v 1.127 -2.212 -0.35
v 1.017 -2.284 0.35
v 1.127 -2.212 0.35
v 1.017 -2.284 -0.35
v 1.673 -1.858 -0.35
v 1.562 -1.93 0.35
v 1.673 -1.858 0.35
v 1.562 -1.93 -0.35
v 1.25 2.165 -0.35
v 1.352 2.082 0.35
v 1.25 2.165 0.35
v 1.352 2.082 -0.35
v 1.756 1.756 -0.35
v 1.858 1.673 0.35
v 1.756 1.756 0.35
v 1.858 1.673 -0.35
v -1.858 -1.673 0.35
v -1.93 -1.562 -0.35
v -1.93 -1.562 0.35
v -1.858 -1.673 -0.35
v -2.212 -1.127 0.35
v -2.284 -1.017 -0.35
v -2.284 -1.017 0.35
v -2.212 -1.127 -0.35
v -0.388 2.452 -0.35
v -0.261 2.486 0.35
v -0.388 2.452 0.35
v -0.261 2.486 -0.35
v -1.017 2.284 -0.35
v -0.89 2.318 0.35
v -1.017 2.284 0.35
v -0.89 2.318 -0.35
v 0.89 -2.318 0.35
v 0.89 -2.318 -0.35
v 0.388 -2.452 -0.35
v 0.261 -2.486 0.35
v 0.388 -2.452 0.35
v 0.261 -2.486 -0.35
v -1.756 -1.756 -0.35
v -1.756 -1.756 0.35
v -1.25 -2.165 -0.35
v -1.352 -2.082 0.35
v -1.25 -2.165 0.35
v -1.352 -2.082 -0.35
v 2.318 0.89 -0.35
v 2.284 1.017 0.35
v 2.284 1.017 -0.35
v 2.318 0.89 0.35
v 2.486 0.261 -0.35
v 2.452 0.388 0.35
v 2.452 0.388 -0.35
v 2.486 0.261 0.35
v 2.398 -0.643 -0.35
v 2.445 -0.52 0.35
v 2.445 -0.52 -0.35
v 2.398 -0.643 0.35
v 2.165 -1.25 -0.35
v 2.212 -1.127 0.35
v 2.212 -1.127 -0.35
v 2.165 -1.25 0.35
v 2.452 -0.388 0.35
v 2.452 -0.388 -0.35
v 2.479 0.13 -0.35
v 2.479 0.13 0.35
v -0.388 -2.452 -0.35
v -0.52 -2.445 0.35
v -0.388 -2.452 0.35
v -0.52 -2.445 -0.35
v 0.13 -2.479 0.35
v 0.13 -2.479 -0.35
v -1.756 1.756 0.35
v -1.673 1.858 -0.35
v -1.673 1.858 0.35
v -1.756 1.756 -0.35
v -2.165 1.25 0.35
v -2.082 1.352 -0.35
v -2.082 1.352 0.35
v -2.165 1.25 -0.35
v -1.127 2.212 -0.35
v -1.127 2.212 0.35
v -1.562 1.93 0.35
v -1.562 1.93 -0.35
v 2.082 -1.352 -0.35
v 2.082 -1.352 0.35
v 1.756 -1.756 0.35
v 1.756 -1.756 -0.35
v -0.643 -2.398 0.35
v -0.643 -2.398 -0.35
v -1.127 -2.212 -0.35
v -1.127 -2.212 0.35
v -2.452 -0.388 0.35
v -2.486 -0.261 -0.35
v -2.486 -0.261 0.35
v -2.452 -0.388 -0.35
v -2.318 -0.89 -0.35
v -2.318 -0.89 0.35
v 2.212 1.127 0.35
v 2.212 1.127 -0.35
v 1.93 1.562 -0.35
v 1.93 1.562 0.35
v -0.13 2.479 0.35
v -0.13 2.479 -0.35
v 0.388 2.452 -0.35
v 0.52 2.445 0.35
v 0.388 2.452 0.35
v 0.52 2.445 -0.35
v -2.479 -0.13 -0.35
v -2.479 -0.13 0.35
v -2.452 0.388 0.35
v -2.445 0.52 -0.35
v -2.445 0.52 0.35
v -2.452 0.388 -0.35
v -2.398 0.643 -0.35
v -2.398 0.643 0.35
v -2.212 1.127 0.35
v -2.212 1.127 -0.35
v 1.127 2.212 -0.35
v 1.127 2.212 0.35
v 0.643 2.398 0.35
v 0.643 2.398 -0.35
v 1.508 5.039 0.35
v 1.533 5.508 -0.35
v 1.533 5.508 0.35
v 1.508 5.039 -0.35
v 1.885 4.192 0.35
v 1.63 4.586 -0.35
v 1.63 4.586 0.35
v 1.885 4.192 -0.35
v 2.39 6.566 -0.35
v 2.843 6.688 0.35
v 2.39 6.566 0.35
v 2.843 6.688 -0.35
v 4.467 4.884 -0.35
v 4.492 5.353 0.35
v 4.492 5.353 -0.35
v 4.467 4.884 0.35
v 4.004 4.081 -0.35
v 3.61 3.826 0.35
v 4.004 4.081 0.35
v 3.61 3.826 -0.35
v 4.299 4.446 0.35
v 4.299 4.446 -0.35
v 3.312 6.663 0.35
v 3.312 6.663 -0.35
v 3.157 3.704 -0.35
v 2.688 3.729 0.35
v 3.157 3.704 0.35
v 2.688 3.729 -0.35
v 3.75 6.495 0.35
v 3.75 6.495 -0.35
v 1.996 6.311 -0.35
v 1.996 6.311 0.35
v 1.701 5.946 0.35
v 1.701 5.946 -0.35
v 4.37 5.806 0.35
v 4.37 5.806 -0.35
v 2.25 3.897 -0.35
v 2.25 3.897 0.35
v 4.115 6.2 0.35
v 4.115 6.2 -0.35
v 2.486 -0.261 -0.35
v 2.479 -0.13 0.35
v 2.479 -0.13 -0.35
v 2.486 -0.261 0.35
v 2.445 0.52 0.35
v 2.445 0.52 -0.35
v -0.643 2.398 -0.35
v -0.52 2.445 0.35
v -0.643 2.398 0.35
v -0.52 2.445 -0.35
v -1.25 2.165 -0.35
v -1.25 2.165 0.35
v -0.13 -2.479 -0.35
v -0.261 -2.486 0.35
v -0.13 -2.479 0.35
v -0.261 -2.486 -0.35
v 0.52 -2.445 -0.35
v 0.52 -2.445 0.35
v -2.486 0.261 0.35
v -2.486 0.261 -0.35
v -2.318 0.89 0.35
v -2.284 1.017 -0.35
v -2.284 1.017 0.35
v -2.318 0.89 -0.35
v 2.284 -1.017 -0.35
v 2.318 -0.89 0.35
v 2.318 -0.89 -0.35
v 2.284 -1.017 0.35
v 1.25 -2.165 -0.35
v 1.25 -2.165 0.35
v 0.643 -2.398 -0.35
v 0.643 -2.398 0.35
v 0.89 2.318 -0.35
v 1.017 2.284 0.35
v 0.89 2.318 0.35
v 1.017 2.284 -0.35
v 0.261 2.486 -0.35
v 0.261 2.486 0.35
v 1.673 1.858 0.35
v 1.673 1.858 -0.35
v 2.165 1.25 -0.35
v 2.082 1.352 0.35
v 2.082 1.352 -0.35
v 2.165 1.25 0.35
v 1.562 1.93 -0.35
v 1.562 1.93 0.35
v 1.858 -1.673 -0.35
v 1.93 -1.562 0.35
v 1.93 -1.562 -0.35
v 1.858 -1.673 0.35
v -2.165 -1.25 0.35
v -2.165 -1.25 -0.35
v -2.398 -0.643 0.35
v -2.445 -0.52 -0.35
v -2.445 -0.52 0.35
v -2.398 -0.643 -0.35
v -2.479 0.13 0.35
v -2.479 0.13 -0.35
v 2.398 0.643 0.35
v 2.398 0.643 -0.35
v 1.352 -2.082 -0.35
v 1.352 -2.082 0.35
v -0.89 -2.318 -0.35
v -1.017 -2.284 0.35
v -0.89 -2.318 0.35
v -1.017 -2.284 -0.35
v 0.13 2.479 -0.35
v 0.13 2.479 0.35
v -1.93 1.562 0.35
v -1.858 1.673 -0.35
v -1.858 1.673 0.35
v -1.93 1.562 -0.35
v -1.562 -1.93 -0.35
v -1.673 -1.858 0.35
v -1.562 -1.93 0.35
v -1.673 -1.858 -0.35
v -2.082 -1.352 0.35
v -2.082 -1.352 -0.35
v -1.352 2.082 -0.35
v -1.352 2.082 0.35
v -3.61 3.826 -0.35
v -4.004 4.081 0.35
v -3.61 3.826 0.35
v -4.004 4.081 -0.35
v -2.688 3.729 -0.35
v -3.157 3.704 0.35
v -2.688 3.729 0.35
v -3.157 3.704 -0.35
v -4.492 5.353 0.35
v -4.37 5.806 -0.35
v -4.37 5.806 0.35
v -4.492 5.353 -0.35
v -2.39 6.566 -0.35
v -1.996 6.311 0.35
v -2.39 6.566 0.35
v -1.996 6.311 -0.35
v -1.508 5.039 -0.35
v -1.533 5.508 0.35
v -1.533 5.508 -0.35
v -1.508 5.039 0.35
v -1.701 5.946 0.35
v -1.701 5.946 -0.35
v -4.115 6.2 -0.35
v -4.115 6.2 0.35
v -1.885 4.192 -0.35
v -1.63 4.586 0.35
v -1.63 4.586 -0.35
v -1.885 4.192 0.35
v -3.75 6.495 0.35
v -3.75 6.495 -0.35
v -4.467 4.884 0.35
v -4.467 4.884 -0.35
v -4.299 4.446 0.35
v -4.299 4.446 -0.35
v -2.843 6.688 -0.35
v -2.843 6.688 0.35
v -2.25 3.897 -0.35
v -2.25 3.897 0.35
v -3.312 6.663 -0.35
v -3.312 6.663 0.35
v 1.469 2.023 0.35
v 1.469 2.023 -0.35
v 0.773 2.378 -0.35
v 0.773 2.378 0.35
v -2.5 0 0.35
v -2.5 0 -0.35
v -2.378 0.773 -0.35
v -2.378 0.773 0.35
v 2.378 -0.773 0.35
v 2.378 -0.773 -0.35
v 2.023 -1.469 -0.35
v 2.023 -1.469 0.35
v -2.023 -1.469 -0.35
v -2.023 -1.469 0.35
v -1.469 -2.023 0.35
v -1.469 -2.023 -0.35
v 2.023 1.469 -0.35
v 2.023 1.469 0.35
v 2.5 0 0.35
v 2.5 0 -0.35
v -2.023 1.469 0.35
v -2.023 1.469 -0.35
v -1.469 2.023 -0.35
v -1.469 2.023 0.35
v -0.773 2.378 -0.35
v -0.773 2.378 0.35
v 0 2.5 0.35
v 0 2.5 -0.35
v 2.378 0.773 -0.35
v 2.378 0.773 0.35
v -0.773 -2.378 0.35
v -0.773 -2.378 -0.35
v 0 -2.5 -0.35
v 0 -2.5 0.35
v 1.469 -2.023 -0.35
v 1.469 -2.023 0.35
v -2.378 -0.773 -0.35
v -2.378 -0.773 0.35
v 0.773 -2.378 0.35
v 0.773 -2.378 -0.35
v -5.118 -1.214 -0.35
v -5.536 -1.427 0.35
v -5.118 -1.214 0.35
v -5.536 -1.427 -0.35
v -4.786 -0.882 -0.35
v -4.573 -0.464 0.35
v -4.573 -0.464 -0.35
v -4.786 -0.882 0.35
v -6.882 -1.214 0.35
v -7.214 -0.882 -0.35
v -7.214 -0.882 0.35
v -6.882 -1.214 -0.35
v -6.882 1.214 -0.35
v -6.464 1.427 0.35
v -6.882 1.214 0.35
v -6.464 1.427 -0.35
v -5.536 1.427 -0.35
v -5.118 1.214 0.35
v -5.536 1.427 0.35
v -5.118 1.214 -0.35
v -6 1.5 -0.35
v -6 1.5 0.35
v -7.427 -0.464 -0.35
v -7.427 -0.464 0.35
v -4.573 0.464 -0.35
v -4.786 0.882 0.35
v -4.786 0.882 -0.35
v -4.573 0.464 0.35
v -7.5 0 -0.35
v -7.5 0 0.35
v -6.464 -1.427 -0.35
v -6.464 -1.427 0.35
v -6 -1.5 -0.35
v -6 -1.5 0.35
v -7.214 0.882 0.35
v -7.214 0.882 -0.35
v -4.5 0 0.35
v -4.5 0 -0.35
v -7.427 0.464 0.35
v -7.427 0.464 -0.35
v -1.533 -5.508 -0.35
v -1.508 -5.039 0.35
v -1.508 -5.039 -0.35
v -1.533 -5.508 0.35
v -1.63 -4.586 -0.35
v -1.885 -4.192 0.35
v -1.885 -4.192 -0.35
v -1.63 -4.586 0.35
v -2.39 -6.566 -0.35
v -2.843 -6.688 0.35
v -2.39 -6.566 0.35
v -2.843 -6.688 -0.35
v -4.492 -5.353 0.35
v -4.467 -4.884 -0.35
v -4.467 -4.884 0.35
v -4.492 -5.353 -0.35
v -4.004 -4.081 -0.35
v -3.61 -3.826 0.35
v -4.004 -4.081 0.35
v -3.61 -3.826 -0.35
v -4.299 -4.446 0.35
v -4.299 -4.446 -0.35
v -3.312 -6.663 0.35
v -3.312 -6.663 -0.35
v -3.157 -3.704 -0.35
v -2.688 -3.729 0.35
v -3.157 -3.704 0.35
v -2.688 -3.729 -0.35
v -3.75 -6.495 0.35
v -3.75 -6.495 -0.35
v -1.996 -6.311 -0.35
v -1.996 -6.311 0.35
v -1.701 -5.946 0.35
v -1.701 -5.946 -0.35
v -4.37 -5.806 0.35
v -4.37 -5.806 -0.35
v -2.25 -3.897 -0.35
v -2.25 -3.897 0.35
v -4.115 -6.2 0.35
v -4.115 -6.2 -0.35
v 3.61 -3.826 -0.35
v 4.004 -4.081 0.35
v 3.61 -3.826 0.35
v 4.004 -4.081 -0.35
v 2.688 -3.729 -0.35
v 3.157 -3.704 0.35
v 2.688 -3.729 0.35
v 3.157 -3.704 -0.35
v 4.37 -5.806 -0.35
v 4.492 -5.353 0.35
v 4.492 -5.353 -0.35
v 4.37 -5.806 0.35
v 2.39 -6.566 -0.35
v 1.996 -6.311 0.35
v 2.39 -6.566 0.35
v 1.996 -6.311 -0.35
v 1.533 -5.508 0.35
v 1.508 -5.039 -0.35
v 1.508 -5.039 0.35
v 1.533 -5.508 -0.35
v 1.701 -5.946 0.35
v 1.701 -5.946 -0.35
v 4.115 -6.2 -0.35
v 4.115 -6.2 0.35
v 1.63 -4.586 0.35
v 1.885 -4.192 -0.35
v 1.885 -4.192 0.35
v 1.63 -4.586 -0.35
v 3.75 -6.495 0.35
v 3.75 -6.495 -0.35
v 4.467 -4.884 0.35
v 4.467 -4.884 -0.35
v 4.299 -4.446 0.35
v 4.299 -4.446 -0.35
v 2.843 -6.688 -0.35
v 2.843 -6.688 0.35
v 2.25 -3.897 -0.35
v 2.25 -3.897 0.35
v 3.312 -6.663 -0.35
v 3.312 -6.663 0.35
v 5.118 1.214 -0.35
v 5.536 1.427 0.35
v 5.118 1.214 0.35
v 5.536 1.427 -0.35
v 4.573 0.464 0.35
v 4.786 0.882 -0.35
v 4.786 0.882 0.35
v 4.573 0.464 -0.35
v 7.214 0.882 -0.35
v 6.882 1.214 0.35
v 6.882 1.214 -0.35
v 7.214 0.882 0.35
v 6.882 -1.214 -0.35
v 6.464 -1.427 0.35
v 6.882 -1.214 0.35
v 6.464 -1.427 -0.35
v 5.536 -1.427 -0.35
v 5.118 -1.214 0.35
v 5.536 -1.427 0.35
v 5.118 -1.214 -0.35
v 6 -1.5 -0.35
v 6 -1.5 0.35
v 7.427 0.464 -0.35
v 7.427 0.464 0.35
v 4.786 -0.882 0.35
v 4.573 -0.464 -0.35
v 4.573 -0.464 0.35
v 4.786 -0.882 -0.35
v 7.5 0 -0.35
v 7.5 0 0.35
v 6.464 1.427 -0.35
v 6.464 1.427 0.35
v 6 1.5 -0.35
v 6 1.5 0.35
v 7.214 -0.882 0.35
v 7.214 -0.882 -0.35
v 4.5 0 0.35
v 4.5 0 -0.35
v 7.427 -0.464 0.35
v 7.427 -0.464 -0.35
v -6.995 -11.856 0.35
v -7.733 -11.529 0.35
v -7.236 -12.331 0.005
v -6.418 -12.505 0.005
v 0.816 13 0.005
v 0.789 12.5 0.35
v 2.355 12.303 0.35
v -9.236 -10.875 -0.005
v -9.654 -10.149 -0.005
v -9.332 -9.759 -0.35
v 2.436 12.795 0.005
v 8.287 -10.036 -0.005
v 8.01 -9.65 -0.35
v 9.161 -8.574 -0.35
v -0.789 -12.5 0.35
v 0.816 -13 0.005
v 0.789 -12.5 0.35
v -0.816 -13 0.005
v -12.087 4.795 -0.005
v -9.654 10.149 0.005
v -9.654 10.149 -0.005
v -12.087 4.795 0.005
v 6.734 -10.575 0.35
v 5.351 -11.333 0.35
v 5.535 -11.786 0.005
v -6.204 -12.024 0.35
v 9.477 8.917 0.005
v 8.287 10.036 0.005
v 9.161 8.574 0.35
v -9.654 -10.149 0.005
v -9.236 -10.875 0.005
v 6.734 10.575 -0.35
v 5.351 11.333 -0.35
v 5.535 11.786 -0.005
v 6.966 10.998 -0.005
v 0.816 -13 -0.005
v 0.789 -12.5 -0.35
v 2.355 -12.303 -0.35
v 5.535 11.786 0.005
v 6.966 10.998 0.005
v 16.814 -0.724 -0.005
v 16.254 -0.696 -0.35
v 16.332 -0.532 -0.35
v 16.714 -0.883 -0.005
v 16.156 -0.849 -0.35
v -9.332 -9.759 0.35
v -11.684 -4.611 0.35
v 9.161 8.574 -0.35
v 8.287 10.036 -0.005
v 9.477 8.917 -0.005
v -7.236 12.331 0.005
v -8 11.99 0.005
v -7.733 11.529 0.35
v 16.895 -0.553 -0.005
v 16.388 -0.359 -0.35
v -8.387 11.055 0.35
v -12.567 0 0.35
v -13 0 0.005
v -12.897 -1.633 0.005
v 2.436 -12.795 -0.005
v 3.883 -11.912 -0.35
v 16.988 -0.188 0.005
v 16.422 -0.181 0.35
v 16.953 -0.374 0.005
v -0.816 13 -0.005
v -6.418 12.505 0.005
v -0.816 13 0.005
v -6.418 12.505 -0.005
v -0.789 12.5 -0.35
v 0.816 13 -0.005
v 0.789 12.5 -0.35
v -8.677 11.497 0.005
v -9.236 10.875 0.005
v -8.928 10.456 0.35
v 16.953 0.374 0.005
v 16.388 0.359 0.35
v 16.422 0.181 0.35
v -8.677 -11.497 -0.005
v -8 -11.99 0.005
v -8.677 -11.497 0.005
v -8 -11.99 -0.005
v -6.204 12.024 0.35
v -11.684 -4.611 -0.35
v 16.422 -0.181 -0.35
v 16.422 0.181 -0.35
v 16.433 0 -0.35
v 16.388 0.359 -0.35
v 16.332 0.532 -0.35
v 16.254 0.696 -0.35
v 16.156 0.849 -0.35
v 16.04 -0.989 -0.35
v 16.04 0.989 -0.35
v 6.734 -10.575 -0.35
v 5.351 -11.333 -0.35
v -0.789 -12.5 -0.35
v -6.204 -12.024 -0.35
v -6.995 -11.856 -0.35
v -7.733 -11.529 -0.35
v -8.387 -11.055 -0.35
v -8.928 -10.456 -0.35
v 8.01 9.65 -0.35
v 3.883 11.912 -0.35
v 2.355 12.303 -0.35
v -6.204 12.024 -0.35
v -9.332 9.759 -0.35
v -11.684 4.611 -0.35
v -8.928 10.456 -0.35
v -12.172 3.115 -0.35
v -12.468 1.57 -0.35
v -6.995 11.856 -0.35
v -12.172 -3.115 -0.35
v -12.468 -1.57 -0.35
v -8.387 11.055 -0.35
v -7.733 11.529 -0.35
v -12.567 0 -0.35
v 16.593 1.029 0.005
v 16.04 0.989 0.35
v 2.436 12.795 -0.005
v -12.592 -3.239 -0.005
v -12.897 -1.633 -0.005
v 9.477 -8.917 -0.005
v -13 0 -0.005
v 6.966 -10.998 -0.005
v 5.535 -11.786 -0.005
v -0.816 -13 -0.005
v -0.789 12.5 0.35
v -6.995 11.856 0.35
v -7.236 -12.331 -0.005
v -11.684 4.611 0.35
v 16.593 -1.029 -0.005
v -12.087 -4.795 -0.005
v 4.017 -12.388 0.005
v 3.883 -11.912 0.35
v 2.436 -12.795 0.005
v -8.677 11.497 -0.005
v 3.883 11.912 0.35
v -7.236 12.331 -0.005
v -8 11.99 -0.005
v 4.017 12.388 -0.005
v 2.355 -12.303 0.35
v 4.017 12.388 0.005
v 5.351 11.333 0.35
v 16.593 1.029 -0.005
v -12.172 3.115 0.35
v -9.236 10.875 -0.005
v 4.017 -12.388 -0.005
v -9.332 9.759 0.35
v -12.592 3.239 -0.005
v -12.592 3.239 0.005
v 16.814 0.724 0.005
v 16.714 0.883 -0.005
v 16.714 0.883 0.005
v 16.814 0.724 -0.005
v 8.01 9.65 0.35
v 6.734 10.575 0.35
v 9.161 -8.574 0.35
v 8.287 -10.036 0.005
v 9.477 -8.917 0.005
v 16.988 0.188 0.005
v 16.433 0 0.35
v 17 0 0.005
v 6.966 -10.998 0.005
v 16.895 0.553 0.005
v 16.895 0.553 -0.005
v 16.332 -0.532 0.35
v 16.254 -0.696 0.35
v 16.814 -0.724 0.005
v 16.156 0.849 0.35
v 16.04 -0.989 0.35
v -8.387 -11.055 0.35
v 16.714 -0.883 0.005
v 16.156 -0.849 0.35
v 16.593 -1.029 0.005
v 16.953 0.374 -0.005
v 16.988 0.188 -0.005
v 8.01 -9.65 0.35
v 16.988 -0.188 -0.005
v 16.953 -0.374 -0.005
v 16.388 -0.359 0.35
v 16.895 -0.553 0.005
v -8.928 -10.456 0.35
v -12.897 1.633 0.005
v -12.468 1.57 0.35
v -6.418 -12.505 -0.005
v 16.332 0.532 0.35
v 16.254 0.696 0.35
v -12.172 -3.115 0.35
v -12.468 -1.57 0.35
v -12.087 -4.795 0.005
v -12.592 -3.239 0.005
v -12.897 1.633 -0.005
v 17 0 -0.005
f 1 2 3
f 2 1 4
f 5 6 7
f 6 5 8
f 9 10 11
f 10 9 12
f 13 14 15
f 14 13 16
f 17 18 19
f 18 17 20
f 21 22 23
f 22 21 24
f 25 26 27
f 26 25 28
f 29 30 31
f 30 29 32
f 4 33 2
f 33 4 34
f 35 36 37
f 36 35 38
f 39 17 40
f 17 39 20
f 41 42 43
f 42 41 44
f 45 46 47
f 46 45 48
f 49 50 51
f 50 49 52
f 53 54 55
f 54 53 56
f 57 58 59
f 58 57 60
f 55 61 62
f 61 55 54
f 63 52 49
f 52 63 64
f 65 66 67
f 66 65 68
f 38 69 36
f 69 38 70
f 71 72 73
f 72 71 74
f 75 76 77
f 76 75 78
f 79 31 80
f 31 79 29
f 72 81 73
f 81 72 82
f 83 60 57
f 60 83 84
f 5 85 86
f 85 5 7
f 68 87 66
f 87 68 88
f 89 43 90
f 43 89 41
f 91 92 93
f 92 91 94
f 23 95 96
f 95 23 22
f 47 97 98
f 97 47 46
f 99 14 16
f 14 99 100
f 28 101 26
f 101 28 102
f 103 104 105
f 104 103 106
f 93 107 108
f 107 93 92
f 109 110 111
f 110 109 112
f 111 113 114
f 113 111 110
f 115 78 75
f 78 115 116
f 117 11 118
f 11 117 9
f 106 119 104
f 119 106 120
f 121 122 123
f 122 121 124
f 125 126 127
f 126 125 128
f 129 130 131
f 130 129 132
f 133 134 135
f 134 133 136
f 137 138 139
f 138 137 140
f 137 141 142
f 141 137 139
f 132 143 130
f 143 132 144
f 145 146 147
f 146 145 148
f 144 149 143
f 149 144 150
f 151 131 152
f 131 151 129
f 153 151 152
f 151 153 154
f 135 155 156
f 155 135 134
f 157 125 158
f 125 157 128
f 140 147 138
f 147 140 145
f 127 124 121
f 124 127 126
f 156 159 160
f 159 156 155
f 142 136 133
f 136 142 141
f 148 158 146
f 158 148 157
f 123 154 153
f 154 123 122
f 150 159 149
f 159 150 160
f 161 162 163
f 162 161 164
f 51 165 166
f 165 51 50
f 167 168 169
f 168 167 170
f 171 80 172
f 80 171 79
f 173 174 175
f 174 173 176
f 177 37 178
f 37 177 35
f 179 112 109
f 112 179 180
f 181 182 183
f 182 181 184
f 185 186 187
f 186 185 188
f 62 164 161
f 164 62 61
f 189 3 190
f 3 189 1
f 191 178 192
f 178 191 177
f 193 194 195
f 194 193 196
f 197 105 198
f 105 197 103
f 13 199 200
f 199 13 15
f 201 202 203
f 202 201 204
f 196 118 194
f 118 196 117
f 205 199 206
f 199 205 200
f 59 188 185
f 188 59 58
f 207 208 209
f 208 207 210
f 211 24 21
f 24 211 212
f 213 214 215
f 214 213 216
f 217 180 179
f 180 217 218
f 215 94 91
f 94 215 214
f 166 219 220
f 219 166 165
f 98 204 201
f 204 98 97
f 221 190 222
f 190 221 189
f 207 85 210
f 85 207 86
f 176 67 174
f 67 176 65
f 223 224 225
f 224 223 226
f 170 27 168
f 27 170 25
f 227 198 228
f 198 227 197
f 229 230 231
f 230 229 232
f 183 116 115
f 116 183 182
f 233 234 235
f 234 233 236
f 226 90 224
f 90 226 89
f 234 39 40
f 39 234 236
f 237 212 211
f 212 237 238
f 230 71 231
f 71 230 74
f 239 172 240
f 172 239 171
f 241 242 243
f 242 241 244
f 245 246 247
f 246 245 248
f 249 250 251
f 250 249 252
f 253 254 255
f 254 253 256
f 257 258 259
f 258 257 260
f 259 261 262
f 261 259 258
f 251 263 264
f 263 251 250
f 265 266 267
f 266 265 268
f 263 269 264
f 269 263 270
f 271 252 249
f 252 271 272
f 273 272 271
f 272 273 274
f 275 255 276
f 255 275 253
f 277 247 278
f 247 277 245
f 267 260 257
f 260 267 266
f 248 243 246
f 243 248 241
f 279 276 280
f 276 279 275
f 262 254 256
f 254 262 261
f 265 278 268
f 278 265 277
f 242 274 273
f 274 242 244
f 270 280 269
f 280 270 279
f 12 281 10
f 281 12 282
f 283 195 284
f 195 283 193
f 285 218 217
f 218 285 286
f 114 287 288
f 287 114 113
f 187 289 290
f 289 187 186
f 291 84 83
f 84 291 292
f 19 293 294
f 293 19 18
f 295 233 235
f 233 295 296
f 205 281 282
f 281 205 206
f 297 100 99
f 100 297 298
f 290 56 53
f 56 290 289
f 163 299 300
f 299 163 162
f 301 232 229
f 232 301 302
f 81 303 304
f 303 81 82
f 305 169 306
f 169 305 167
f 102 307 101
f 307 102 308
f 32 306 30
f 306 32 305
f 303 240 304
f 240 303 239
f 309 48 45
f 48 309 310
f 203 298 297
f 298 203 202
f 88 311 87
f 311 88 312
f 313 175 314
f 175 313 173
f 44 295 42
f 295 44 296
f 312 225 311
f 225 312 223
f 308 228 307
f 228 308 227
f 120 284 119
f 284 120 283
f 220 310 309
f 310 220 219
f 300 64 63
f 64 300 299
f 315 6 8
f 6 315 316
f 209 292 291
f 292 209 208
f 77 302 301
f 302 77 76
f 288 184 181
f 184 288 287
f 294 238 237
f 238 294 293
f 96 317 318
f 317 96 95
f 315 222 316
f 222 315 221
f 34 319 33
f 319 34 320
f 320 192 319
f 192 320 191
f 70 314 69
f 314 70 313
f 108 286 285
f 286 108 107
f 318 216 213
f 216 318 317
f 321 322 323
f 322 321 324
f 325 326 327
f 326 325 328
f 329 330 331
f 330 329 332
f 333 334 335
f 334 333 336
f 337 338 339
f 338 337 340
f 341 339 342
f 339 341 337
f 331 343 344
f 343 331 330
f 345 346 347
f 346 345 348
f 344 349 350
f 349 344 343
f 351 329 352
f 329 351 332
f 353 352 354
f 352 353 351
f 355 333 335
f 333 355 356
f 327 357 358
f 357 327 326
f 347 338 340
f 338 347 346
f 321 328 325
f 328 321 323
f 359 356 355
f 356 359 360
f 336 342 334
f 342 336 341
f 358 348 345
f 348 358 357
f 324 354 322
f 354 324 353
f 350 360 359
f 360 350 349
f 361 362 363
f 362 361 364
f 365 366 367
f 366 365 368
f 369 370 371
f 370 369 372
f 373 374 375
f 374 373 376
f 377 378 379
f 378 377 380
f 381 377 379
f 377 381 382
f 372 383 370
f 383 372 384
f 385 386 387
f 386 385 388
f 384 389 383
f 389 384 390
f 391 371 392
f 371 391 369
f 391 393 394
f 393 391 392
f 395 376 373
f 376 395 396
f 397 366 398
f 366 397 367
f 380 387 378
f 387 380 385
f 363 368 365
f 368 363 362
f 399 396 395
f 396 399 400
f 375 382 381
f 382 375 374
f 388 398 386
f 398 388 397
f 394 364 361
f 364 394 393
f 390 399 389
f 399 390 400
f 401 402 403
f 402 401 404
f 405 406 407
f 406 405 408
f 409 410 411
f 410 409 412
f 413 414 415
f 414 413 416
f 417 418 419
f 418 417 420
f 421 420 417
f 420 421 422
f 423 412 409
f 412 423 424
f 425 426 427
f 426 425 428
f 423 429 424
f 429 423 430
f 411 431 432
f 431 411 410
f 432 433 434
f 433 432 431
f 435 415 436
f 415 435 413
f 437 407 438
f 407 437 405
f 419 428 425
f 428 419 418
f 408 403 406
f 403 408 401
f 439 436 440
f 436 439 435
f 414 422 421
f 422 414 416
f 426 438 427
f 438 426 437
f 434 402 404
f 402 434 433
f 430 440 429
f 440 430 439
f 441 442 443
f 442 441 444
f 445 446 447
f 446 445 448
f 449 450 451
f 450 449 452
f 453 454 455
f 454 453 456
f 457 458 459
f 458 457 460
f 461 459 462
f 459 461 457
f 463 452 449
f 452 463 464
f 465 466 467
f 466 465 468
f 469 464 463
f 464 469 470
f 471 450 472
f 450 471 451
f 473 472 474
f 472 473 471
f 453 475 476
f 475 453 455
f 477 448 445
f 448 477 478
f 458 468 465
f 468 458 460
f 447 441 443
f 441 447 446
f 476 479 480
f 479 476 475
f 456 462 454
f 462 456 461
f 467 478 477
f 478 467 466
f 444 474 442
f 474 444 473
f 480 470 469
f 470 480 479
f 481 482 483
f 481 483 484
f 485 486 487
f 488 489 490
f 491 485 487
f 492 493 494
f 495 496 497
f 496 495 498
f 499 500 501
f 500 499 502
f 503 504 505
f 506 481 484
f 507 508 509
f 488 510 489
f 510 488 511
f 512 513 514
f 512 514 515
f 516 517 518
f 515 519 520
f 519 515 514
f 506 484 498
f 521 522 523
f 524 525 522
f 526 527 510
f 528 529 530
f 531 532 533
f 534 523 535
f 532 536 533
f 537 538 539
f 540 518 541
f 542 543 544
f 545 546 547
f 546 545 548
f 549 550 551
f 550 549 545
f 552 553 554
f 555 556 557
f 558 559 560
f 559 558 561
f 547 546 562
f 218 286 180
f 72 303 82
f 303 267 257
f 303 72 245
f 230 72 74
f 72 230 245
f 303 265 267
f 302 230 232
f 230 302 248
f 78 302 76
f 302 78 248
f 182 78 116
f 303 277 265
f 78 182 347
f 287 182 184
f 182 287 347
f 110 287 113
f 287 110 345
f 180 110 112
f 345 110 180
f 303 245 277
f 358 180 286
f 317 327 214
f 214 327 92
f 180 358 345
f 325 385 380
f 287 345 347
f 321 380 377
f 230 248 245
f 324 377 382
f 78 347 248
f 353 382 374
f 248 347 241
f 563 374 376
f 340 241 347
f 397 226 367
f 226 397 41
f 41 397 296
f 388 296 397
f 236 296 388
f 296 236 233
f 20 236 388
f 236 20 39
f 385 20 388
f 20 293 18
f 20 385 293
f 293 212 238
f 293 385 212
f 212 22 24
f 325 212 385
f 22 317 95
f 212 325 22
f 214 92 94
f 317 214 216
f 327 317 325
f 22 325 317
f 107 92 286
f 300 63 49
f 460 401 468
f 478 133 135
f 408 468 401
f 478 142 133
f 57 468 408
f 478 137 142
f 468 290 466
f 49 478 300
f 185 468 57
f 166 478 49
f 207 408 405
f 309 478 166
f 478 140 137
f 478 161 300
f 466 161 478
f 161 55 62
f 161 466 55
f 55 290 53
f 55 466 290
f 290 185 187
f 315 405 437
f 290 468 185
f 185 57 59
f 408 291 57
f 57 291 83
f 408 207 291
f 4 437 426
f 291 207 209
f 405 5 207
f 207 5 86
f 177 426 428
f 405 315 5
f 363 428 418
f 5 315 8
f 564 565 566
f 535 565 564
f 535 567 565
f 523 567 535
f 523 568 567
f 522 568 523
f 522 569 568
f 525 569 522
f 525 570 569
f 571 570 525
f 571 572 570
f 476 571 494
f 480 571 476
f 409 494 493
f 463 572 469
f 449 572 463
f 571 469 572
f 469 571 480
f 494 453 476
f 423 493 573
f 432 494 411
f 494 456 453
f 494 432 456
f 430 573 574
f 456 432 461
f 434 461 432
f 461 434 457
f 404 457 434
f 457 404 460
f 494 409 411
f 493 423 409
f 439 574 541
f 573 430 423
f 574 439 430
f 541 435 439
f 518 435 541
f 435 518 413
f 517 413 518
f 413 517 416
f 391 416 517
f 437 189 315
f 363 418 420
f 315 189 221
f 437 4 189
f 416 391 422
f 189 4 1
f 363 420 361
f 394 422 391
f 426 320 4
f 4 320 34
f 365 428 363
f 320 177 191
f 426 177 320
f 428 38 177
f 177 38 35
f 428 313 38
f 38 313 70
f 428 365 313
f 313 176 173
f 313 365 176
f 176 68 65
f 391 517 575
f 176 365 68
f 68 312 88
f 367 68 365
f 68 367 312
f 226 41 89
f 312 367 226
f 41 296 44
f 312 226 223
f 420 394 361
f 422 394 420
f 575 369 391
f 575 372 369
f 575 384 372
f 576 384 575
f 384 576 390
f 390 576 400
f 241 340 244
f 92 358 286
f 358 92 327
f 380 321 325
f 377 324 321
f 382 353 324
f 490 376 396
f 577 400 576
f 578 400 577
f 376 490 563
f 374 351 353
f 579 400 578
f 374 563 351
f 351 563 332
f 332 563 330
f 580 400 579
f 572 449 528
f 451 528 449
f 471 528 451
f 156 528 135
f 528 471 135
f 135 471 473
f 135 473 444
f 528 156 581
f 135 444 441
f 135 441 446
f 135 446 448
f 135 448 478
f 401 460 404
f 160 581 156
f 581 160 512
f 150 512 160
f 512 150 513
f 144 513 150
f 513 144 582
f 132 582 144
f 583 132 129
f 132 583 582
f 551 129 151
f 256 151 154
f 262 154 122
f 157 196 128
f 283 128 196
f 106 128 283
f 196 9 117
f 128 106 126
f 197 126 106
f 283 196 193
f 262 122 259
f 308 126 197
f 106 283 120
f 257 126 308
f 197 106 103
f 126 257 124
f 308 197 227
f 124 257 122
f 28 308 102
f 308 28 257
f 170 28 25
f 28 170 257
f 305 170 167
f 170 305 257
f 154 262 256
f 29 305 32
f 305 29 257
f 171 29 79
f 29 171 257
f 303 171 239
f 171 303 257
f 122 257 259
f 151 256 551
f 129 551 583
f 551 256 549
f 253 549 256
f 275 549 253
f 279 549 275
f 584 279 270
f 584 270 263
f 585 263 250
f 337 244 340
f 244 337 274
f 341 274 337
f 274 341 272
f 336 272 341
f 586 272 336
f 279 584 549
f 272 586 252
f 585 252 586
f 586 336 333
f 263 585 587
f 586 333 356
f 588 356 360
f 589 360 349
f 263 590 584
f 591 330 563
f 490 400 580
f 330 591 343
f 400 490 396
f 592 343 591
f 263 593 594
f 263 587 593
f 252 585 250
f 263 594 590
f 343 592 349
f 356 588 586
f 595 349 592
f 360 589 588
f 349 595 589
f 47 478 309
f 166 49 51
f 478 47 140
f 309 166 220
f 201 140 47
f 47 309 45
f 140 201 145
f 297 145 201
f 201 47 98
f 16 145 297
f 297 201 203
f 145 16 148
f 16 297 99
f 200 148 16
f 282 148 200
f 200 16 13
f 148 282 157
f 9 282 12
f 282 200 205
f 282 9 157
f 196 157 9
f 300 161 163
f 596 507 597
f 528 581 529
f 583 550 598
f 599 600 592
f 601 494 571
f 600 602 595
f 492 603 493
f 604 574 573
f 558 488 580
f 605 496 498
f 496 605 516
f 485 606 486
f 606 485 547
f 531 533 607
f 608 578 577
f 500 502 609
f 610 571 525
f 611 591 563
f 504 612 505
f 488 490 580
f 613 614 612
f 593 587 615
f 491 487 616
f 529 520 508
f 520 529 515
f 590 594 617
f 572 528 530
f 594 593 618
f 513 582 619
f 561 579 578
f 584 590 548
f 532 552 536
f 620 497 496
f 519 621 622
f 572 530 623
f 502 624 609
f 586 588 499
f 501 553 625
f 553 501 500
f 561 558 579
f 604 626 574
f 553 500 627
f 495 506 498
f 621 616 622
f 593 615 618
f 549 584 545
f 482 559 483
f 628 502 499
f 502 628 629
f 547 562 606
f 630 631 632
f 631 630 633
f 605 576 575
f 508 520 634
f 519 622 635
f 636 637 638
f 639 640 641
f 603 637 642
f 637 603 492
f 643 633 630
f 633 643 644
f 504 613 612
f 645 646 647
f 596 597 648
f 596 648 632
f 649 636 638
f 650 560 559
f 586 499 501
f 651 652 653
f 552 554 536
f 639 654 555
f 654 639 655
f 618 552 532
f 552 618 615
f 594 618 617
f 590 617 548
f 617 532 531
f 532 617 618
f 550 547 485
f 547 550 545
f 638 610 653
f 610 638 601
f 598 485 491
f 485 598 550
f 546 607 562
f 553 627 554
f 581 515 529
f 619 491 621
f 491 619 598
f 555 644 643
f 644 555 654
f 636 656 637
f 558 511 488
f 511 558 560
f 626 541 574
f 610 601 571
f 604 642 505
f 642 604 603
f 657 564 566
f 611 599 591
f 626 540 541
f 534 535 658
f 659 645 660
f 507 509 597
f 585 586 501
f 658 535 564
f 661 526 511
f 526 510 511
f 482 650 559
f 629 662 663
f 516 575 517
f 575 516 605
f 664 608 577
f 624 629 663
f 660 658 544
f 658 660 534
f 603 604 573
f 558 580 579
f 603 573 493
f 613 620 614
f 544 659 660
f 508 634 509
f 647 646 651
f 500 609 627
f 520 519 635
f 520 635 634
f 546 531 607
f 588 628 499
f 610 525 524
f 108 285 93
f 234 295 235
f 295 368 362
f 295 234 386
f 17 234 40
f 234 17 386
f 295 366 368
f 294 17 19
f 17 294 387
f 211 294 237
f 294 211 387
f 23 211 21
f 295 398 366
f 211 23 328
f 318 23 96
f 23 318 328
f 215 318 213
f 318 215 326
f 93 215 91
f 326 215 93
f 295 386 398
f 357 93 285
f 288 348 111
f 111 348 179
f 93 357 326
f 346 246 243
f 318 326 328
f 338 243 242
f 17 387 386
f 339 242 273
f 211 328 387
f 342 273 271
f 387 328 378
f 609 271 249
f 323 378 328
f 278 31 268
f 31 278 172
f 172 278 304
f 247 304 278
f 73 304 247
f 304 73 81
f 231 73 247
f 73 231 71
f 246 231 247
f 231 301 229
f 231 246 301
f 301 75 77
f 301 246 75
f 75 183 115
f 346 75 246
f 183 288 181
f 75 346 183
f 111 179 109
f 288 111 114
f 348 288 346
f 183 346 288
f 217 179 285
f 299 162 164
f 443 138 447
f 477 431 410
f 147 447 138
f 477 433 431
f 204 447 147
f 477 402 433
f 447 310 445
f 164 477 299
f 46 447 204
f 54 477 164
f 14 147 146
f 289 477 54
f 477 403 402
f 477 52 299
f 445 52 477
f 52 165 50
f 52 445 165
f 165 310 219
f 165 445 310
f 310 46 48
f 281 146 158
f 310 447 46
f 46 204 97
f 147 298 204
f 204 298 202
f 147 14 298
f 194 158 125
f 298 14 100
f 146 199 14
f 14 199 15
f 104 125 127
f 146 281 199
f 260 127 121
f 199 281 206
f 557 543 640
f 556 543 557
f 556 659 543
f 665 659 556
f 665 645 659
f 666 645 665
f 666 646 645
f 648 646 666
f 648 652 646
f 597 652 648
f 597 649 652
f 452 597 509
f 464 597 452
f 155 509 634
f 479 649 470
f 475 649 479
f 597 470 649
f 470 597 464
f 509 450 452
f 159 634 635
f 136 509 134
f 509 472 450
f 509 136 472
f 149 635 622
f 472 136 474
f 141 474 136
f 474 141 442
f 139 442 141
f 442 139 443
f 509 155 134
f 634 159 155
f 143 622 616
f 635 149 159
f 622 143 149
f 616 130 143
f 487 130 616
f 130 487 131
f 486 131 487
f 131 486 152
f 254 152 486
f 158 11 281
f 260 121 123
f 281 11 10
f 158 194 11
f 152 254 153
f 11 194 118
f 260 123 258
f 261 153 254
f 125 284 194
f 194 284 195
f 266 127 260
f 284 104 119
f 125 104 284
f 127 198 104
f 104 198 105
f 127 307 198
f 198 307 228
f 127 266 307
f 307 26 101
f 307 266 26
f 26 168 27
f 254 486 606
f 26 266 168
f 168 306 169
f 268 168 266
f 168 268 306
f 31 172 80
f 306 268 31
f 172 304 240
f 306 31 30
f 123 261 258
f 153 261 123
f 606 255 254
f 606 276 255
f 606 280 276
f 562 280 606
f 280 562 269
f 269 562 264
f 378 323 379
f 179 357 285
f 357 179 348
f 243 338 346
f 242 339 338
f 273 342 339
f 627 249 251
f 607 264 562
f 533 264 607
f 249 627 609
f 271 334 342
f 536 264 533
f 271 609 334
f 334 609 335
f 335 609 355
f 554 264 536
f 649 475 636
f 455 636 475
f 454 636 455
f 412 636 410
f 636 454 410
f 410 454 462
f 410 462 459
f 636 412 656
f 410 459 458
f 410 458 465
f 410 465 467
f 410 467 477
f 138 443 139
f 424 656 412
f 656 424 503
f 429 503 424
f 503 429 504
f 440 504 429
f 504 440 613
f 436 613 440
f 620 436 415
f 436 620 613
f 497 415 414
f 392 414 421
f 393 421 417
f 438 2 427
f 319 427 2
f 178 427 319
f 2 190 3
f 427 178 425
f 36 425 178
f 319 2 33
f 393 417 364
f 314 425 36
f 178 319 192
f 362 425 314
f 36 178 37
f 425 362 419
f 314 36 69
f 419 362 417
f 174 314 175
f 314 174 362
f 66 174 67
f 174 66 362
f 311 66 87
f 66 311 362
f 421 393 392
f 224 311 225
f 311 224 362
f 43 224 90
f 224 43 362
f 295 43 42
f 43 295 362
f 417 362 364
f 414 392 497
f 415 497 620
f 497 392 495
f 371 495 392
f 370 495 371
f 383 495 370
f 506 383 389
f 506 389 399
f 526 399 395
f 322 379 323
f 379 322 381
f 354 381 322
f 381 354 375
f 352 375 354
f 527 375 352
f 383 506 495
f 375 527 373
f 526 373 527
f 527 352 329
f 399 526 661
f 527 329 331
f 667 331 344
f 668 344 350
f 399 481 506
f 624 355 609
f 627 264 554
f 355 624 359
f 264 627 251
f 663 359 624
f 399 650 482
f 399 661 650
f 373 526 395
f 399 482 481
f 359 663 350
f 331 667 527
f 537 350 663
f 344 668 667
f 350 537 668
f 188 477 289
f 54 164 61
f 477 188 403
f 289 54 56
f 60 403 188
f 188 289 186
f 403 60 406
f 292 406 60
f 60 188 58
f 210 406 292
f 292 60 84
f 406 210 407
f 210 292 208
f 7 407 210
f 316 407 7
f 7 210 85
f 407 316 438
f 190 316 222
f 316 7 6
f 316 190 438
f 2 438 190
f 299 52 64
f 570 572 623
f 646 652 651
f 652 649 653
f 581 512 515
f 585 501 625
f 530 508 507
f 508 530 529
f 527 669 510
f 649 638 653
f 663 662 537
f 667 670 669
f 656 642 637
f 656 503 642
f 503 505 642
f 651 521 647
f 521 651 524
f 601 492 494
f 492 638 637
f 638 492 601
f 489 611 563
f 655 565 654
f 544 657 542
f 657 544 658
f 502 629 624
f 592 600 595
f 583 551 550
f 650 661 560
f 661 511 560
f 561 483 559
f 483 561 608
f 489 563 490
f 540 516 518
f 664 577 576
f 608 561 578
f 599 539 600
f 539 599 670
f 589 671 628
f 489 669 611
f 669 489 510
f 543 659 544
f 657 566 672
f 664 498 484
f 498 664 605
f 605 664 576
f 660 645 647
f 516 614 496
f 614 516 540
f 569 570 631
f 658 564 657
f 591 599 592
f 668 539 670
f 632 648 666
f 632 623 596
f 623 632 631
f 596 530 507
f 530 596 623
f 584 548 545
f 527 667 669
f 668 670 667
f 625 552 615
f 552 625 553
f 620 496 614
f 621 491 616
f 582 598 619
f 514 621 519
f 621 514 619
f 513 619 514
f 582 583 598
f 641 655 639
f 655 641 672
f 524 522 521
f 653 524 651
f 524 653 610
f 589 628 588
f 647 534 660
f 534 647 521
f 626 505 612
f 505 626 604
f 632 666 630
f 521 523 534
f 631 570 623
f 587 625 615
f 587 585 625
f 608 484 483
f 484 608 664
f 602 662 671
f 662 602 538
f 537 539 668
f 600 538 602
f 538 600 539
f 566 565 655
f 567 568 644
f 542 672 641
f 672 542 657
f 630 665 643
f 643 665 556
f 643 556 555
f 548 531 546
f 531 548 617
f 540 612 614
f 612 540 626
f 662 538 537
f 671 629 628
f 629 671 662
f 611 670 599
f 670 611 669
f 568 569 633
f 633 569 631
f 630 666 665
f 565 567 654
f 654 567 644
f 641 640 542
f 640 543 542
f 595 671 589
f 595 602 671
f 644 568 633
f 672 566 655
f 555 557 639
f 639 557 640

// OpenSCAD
// Ultra Grip Pick 0.1 - a parametric symmetrical plectrum designed to be ultra-grippy, Antti Suomela August 2017
// CC-BY-SA-NC - Creative Commons Attribution-NonCommercial-ShareAlike 3.0

/* Set thickness, length, and other parameters as you like. */ 
thickness = 0.7;        // plectrum thickness, as expected, default: 0.7 
length = 30;            // from base to tip (hint: keep the plectrum longer than it is wide for best results) default: 30
width = 26;             // speaks for itself, default: 26
taper = 1;              // default: 1mm taper distance from the thick bit to the very edge

/* Not commonly changed, but nevertheless changeable variables. Chunk and funk change the shape of the plectrum in a certain way. Experiment! :-) */
chunk = 0.327;         // practical range 0 to 0.345 to avoid going beyond set length and width parameters, experiment! :-) (default: 0.327)
funk = 0.2;            // practical range 0 to 0.3 without going beyond set length and width parameters (default: 0.2)

/* The following are the grip hole parameters. Adjust to your liking. */
hole_size = 5;          // diameter in millimetres, default: 5
hole_separation = 6;


i = 0;

module main_part(t) {               // this establishes the shape and size of the plectrum, the t parameter is the thickness
    linear_extrude(height = t, convexity = 10, center = true)
    resize(newsize=[length, width, thickness])
    hull() {
            circle(width / 2, $fn = 50);
            translate([funk * -length, chunk * width, 0])
                circle(4, $fn = 30);              // base corner #1
            translate([funk * -length, chunk * -width, 0])
                circle(4, $fn = 30);              // base corner #2
            translate([length - width / 2 - 1.5, 0, 0])
                circle(1.5, $fn = 50);                              // tip
    }

}
module taper() {                    // this does the tapering at the edge of the plectrum
    hull() {
            resize(newsize=[length - taper, width - taper, thickness])      
            main_part(thickness);
            main_part(0.01);        
    }
}


module hole_tool(size) {                // this creates the tool used to cut the holes later in create_holes
    circle(d = size, $fn = 20);
}
    


module create_holes() {
    difference() {   
        taper();     
        translate([0,0,0])
        for (i = [0:5]) {      
            rotate([0,0,60+i*60])
            for(i = [0:10]) {
                    if (i*hole_separation+hole_size < width / 2) {
                        linear_extrude(height = thickness + 1, center = true)
                        translate([i*hole_separation,0,0])
                        if (i == 0) { hole_tool(hole_size); }
                        else { hole_tool(hole_size/2+(i*i)/2); }
                        
                    }
                
            }
        }
    }
}

create_holes();
